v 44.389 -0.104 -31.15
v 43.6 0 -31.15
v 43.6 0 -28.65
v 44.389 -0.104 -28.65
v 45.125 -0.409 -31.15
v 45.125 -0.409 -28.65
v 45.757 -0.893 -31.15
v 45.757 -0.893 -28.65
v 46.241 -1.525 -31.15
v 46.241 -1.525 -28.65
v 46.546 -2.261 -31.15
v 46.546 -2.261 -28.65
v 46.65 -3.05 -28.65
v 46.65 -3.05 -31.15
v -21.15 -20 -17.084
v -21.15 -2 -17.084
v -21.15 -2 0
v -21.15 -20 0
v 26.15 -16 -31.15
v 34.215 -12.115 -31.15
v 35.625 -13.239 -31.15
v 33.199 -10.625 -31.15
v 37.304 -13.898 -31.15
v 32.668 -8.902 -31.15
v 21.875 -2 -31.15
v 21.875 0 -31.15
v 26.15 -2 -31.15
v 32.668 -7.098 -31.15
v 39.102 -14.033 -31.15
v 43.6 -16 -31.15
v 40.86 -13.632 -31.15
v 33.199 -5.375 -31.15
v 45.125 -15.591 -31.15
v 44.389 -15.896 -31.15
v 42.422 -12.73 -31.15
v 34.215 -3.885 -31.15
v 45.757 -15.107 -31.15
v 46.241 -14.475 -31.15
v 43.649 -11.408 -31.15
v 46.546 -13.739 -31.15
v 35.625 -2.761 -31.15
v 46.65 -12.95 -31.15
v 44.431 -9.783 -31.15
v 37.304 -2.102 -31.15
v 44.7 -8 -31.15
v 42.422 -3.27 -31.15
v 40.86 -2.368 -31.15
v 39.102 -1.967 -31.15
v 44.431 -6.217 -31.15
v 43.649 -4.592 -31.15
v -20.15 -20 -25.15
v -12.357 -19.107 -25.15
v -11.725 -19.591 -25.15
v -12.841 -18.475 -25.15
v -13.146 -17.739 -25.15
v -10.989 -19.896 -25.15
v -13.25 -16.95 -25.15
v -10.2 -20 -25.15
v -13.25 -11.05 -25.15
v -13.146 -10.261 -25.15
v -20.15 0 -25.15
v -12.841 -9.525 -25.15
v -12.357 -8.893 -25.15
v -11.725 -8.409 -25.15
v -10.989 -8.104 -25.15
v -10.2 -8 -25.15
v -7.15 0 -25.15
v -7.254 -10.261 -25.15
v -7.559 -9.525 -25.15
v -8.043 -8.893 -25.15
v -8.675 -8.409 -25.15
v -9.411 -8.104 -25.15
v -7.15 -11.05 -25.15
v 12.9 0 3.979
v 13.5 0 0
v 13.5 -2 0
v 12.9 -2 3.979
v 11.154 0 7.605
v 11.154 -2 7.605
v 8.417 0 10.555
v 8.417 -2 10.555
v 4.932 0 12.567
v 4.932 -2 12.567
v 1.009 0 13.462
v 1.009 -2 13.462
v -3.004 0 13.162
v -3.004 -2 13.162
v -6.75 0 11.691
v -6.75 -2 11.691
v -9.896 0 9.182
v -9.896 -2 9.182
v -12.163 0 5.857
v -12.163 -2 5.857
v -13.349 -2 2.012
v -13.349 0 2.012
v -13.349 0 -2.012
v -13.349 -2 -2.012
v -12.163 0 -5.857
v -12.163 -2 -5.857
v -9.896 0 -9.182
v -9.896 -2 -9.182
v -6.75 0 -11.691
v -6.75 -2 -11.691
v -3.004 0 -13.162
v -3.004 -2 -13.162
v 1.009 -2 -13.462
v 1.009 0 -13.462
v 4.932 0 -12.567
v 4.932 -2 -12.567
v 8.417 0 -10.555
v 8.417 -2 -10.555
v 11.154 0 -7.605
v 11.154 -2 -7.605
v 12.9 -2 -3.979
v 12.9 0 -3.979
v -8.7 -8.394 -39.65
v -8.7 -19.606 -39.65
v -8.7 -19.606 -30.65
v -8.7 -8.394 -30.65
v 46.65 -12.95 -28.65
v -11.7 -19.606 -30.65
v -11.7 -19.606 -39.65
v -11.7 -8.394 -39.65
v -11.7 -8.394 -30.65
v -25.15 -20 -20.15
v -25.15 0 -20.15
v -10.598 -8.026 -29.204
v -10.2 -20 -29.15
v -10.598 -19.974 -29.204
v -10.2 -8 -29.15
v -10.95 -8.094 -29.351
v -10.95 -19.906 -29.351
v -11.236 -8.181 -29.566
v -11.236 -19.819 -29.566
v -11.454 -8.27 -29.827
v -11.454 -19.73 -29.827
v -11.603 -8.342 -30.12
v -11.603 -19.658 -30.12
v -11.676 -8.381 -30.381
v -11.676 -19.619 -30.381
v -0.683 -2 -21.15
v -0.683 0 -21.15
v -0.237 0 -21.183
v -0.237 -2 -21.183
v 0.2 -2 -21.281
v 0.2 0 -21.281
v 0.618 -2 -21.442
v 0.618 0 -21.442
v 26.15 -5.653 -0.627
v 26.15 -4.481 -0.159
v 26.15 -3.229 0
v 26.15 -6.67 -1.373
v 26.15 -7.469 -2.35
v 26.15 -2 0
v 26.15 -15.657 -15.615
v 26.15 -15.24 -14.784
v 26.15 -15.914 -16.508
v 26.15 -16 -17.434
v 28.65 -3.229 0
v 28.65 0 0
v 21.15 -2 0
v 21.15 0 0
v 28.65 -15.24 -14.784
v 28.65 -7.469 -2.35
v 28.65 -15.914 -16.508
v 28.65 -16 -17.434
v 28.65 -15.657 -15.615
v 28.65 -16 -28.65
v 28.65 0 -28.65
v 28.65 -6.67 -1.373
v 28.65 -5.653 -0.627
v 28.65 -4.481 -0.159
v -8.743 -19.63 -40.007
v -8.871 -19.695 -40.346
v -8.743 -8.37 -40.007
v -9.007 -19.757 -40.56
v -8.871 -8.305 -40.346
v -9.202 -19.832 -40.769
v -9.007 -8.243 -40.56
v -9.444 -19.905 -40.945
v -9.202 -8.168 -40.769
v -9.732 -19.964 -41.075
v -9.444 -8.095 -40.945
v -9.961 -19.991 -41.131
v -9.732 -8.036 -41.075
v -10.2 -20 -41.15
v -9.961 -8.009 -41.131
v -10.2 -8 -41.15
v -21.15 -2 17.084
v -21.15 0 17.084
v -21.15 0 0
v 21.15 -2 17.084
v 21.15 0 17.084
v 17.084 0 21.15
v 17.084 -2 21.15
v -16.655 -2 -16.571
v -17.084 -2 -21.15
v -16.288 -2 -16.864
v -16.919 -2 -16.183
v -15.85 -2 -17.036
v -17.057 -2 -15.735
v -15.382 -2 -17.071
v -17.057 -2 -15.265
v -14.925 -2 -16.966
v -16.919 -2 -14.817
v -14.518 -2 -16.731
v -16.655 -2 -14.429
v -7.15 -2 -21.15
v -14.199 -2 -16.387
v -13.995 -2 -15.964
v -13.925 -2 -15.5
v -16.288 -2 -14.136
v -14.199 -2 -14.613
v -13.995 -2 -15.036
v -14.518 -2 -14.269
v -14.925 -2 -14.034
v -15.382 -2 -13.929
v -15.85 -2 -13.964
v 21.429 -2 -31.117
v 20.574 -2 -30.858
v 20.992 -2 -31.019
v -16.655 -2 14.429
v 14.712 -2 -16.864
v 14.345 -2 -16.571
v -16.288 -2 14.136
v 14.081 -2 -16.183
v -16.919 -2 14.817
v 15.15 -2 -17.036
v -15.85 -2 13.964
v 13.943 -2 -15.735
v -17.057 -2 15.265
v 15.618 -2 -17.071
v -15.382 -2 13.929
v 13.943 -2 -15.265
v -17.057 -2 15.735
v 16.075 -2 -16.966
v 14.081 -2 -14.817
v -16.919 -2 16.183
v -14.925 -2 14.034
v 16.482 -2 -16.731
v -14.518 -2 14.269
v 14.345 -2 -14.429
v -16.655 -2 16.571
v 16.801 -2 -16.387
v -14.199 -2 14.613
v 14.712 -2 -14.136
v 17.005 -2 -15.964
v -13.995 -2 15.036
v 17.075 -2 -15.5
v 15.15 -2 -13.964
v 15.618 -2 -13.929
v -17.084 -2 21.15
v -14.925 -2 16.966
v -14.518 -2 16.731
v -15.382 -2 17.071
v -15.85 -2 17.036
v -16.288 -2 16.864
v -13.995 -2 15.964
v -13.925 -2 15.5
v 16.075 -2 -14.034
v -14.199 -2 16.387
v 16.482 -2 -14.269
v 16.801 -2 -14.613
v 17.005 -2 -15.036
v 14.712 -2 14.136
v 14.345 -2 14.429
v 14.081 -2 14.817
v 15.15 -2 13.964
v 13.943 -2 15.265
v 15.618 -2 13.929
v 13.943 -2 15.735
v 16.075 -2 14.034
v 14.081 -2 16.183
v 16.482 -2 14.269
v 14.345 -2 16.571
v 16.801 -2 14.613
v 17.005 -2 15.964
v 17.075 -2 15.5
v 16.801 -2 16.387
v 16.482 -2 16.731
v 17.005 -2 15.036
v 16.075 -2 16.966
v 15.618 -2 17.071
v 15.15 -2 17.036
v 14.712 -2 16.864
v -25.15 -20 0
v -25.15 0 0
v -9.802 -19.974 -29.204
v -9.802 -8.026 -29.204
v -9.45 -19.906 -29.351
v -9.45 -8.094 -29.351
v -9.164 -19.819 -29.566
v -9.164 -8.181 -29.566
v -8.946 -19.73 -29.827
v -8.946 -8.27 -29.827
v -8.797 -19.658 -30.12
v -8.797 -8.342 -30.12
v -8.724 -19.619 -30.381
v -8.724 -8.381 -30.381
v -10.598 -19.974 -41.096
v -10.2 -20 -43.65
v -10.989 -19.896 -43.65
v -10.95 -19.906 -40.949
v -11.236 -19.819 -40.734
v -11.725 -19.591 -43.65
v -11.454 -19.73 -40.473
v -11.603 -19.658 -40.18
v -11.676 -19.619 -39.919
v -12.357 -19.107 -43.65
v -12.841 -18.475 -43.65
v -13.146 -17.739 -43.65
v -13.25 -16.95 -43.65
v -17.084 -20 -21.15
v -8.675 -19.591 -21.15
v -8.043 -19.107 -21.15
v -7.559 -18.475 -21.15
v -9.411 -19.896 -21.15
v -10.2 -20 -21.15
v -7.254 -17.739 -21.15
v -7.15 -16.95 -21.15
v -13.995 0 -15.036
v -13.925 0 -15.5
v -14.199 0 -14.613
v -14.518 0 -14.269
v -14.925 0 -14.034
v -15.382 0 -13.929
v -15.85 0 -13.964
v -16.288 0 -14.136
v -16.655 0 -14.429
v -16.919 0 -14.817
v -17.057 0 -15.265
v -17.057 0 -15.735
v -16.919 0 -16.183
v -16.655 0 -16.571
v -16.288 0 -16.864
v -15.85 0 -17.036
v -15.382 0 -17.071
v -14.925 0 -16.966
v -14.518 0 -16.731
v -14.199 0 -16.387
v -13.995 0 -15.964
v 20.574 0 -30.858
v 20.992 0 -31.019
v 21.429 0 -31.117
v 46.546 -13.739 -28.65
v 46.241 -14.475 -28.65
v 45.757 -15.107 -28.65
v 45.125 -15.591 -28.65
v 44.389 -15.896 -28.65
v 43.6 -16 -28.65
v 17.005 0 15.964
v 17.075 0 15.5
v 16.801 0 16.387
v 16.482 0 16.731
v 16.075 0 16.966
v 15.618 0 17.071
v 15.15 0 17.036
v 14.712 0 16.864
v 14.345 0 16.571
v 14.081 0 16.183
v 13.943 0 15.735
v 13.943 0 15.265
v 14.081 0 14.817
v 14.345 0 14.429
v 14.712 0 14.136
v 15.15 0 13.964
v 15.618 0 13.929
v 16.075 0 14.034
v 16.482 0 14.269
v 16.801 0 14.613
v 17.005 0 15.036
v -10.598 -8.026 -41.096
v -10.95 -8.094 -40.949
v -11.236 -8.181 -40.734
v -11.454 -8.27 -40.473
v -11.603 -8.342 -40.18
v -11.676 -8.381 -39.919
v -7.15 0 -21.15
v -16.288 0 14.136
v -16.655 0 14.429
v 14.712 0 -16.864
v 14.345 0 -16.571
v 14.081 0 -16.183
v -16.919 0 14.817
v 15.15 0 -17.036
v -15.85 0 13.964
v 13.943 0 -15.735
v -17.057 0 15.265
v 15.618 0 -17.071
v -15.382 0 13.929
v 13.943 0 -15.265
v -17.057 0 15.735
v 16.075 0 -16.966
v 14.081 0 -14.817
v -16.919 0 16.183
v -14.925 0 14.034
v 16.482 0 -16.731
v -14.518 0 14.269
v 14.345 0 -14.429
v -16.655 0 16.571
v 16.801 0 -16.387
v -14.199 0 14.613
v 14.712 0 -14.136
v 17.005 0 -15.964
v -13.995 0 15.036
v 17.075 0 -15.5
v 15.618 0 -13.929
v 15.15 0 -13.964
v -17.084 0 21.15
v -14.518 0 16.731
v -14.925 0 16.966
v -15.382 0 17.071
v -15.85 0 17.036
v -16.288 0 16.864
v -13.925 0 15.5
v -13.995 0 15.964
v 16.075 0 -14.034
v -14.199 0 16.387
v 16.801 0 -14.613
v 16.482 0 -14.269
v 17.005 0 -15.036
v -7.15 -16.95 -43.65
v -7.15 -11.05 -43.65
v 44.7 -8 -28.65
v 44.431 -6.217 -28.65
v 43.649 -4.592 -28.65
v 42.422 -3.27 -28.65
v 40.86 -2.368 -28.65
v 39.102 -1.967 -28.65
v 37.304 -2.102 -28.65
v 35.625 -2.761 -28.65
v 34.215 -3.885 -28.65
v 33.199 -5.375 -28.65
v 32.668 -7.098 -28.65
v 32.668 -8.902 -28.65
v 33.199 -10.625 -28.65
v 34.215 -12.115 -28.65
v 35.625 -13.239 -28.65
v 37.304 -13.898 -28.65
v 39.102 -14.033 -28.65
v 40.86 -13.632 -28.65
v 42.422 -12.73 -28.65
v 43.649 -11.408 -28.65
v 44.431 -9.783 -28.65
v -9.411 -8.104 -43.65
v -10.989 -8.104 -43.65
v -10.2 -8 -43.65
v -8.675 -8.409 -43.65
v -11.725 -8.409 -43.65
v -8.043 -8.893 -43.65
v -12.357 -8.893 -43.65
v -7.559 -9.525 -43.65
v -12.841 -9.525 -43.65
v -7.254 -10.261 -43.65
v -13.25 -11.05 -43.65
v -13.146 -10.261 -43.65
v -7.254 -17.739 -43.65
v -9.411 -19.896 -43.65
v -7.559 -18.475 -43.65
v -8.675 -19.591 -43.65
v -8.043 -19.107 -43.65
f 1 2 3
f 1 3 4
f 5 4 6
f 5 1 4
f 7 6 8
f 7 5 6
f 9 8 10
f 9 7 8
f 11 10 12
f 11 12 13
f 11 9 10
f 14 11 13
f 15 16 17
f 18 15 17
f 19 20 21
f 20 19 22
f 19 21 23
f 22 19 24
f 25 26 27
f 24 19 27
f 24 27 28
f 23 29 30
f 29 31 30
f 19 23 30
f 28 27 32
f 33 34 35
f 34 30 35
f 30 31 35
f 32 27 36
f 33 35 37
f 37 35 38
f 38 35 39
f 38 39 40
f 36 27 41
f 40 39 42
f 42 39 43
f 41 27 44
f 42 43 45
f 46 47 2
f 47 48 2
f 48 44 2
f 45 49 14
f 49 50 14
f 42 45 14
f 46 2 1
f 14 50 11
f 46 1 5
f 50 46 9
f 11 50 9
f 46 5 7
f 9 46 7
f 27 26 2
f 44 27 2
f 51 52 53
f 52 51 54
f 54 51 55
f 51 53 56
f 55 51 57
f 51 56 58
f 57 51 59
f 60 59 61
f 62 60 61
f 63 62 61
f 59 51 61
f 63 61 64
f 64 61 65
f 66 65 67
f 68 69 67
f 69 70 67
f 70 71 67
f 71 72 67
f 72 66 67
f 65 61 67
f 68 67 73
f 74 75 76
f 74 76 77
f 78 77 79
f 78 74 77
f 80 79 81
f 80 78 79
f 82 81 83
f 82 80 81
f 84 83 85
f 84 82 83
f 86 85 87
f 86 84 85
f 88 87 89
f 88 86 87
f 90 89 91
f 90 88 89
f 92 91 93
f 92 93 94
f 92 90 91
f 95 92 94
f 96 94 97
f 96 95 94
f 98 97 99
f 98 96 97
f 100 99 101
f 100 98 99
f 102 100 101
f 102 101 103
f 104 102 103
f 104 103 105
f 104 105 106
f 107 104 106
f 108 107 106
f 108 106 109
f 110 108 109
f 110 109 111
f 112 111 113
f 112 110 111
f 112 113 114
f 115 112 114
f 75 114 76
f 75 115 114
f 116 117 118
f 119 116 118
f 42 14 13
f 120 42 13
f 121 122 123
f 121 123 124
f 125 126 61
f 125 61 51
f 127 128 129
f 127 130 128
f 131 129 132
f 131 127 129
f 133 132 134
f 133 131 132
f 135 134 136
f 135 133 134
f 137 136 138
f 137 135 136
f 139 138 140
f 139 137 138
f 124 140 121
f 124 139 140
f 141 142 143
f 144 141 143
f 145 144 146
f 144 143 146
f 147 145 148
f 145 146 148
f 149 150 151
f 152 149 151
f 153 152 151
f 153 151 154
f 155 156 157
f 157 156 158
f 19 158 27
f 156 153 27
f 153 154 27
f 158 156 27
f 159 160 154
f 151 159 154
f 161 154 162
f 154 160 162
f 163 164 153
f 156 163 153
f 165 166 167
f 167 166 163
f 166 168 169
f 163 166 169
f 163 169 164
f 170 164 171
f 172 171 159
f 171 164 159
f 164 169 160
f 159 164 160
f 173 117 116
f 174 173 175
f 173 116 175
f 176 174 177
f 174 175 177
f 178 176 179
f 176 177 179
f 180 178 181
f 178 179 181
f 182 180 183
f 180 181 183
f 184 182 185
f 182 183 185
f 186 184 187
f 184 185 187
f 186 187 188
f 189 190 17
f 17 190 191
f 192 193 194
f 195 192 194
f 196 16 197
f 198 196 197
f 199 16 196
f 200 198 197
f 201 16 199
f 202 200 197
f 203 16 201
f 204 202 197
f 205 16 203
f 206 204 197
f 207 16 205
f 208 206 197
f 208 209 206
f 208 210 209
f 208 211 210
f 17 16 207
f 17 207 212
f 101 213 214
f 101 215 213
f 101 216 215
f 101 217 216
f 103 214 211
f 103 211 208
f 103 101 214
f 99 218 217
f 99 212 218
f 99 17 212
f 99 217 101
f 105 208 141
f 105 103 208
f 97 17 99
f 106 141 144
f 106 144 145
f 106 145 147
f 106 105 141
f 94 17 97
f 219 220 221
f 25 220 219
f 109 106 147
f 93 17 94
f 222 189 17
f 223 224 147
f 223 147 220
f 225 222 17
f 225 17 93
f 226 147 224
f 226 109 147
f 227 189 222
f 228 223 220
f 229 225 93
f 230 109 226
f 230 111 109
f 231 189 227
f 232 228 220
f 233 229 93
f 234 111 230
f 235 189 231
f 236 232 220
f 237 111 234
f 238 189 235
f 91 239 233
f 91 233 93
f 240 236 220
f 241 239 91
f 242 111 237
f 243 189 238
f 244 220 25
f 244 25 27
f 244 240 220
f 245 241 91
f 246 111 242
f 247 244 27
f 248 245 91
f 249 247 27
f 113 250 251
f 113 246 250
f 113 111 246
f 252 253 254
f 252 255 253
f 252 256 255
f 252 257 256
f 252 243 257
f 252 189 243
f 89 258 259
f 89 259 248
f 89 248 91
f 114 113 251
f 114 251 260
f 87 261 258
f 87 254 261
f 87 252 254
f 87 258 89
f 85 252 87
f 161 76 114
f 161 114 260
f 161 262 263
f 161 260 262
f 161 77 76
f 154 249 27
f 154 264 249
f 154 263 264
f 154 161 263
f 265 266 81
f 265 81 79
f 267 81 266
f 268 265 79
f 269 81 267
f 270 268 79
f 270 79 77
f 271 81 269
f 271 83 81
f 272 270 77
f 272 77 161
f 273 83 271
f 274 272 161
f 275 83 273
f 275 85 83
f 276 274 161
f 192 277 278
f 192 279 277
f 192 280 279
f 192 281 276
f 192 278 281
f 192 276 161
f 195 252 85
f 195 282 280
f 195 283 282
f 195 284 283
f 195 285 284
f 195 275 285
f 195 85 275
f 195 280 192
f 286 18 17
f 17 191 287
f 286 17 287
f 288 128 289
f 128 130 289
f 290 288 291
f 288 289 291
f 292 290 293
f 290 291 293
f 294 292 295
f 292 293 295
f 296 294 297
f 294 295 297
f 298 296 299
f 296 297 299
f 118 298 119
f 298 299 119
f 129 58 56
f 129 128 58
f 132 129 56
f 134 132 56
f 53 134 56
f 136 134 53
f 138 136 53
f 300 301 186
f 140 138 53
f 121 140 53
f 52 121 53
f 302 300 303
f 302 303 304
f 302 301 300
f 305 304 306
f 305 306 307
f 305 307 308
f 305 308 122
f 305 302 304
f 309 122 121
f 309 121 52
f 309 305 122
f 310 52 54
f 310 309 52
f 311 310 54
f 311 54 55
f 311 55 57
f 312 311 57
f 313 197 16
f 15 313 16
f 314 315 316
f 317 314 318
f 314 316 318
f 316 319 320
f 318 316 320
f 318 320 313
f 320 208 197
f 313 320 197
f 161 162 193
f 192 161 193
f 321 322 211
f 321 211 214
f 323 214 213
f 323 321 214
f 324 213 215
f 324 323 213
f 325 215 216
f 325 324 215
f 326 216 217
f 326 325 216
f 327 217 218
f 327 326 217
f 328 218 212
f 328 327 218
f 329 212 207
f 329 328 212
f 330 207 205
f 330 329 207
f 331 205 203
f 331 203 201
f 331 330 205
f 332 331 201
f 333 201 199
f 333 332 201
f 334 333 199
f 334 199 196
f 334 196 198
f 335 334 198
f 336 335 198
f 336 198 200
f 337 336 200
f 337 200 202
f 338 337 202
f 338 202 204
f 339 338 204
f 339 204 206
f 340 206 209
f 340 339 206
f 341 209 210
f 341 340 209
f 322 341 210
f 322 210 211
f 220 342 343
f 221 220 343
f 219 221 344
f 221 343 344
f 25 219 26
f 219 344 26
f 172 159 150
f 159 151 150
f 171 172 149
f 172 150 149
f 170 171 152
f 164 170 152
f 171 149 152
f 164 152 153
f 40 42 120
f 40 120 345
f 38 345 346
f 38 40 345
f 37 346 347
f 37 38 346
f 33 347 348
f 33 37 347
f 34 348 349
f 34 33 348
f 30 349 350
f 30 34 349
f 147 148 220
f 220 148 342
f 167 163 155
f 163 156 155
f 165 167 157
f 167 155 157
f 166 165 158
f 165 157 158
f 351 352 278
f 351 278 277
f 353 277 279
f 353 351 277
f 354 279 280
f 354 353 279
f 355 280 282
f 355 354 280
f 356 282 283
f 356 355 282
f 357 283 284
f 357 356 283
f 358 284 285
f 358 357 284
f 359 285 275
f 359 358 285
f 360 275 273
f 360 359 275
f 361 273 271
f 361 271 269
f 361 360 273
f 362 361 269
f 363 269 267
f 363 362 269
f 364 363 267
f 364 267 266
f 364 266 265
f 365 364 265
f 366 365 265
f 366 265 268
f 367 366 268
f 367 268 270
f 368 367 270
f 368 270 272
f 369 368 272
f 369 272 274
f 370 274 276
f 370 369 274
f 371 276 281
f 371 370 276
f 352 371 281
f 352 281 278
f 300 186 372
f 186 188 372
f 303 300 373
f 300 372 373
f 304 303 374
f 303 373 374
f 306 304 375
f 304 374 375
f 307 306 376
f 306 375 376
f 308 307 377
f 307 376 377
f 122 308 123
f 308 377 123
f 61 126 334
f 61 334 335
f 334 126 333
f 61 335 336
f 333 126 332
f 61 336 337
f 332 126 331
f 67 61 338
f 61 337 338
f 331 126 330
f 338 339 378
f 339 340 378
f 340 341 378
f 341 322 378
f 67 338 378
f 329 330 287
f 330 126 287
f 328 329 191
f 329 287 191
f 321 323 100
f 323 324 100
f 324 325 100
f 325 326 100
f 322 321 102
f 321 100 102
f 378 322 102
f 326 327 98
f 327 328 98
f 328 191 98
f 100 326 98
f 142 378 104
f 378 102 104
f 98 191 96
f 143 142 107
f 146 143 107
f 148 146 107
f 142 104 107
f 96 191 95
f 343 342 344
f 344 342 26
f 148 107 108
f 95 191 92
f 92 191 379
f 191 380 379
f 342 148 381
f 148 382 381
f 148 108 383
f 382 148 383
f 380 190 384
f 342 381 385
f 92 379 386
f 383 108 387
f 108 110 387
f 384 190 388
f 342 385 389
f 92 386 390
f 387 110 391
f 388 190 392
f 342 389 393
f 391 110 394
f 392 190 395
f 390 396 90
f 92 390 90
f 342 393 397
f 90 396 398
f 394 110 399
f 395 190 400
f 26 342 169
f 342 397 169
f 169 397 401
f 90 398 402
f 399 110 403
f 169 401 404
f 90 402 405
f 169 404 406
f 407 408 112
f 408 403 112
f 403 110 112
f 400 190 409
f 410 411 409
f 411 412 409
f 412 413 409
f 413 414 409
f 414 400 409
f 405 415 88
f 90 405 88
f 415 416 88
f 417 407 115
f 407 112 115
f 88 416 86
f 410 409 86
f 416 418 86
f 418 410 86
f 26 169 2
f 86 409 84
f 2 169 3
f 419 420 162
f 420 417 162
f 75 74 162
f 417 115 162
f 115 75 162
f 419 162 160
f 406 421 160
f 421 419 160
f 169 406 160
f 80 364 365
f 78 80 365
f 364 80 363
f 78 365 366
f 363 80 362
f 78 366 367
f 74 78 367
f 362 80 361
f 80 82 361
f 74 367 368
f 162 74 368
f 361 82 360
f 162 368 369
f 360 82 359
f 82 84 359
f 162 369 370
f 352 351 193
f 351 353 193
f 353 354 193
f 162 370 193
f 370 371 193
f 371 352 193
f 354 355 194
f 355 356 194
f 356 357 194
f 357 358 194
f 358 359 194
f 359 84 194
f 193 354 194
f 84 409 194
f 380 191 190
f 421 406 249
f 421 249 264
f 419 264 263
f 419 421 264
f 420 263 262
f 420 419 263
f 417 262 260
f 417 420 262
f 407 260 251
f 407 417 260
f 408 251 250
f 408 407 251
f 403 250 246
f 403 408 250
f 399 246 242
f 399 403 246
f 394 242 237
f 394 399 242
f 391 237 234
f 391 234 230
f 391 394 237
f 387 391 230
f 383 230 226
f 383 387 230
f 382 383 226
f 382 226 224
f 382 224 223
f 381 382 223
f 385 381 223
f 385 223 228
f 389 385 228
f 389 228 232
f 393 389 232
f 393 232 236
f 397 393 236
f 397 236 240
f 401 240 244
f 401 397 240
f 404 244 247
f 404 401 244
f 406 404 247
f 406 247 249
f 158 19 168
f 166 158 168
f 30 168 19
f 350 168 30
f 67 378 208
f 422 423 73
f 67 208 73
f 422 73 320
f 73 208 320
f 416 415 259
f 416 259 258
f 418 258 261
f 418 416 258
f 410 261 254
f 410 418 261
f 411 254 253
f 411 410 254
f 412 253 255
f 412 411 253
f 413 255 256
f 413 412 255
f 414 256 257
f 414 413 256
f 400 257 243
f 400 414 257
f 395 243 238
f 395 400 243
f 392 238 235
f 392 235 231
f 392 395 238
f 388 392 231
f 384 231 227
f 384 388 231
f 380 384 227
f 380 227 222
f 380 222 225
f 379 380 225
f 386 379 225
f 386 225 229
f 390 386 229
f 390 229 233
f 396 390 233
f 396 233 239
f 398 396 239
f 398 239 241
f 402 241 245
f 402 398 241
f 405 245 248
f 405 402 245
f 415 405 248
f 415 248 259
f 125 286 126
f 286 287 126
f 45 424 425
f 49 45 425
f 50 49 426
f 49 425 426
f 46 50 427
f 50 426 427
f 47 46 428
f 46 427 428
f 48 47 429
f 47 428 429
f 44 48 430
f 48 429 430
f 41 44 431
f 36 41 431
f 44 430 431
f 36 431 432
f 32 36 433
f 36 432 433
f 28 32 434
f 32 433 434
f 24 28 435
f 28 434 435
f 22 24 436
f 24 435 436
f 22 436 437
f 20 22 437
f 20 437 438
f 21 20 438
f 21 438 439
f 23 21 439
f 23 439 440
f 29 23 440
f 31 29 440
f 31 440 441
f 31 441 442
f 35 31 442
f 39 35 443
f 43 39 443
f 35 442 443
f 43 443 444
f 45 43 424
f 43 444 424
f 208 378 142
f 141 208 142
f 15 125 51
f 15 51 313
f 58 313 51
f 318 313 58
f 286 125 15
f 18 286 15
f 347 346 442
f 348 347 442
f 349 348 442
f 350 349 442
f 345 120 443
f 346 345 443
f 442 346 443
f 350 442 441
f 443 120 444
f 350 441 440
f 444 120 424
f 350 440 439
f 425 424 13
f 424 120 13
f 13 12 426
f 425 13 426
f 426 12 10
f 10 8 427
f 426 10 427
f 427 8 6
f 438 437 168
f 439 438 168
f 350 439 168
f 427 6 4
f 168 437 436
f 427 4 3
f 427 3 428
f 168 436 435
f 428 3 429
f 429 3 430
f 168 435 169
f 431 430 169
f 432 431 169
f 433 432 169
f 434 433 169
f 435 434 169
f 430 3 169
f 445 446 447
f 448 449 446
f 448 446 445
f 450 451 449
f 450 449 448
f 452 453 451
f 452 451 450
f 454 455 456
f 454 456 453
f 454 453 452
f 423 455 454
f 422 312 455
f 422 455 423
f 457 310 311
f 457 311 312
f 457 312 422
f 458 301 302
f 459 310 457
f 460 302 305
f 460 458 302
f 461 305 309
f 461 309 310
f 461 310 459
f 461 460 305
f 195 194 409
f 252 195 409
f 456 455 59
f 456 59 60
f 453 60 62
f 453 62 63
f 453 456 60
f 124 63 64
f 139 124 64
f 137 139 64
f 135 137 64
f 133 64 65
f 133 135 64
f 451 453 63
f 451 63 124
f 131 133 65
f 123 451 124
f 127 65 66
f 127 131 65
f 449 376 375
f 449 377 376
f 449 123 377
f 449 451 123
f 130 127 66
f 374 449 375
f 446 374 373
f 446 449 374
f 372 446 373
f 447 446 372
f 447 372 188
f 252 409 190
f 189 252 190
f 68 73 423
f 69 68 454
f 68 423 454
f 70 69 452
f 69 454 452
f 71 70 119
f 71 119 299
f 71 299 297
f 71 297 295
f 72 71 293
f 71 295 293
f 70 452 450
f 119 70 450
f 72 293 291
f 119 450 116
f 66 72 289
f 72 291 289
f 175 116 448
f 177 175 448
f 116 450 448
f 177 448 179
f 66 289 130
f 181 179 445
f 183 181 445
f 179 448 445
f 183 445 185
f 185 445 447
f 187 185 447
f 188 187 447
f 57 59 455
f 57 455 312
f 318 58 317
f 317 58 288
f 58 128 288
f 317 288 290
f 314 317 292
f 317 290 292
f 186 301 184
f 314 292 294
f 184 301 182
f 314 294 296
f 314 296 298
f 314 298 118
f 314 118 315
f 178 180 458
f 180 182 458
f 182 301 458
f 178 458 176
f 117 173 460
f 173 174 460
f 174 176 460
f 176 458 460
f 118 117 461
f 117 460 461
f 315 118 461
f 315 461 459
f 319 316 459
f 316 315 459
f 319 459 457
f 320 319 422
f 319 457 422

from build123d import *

# Parameters (mm, degrees)
F0_R         = 1.575
F0_R_2       = 13.5
F0_W         = 5
F0_H         = 21.15
F1_DEPTH     = 2
F2_DEPTH     = 20
F3_DEPTH     = 16
F4_R         = 6.05
F5_DEPTH     = 2.5
F6_W         = 6.1
F6_H         = 12
F7_DEPTH     = 18.5
F8_W         = 3
F8_H         = 12
F9_DEPTH     = 12
F10_T1_DEPTH = 2
F10_T3_DEPTH = 26.125
F10_T5_DEPTH = 37.75
F10_T7_DEPTH = 17.75
F10_T9_DEPTH = 5.4173756904
F11_R        = 1.49999
F12_SIZE     = 5
F13_SIZE2    = 16
F13_SIZE     = 10
F14_R        = 5


# Not quite as in the source:
# - a fillet or chamfer that OpenCascade refuses, or shapes differently, is made with other operations: its cross-section is extruded or revolved along the edge and cut away or added
# - a fillet or chamfer is up to 0.001 mm smaller than in the source, because OpenCascade refuses the exact size
# - a feature names something its author has since deleted; it is built from what else it names


with BuildPart() as f1:
    # F0 (on Front) → F1 (new body)
    with BuildSketch(Plane.XZ):
        Polygon((-21.15, -17.0841360082), (-21.15, 0), (-25.15, 0), (-25.15, -25.15), (-7.15, -25.15), (-7.15, -21.15), (-17.0841360082, -21.15), (-21.15, -21.15), align=None)
        Polygon((21.15, 17.0841360082), (17.0841360082, 21.15), (-17.0841360082, 21.15), (-21.15, 17.0841360082), (-21.15, 0), (-21.15, -17.0841360082), (-17.0841360082, -21.15), (-7.15, -21.15), (0, -21.15), (21.15, -21.15), (21.15, 0), align=None)
        with Locations((-15.5, -15.5)):
            Circle(F0_R, mode=Mode.SUBTRACT)
        with Locations((15.5, -15.5)):
            Circle(F0_R, mode=Mode.SUBTRACT)
        Circle(F0_R_2, mode=Mode.SUBTRACT)
        with Locations((-15.5, 15.5)):
            Circle(F0_R, mode=Mode.SUBTRACT)
        with Locations((15.5, 15.5)):
            Circle(F0_R, mode=Mode.SUBTRACT)
        Polygon((-17.0841360082, -21.15), (-21.15, -17.0841360082), (-21.15, -21.15), align=None)
        Polygon((26.15, -21.15), (21.15, -21.15), (0, -21.15), (21.1919918656, -31.15), (26.15, -31.15), align=None)
        Polygon((28.65, 0), (26.15, 0), (26.15, -21.15), (26.15, -31.15), (46.65, -31.15), (46.65, -28.65), (28.65, -28.65), align=None)
        with Locations((23.65, -10.575)):
            Rectangle(F0_W, F0_H)
    extrude(amount=F1_DEPTH)

    # F0 (on Front) → F2 (join)
    with BuildSketch(Plane.XZ):
        Polygon((-21.15, -17.0841360082), (-21.15, 0), (-25.15, 0), (-25.15, -25.15), (-7.15, -25.15), (-7.15, -21.15), (-17.0841360082, -21.15), (-21.15, -21.15), align=None)
        Polygon((-17.0841360082, -21.15), (-21.15, -17.0841360082), (-21.15, -21.15), align=None)
    extrude(amount=F2_DEPTH)

    # F0 (on Front) → F3 (join)
    with BuildSketch(Plane.XZ):
        Polygon((28.65, 0), (26.15, 0), (26.15, -21.15), (26.15, -31.15), (46.65, -31.15), (46.65, -28.65), (28.65, -28.65), align=None)
    extrude(amount=F3_DEPTH)

    # F4 (on face) → F5 (cut, through all)
    with BuildSketch(Plane.XY.offset(-28.65)):
        with Locations((38.65, -8)):
            Circle(F4_R)
    extrude(amount=-F5_DEPTH, mode=Mode.SUBTRACT)

    # F6 (on face) → F7 (join)
    with BuildSketch(Plane(origin=(0, 0, -25.15), x_dir=(1, 0, 0), z_dir=(0, 0, -1))):
        with Locations((-10.2, 14)):
            Rectangle(F6_W, F6_H)
    extrude(amount=F7_DEPTH)

    # F8 (on face) → F9 (cut, through all)
    with BuildSketch(Plane.XZ.offset(20)):
        with Locations((-10.2, -35.15)):
            Rectangle(F8_W, F8_H)
    extrude(amount=-F9_DEPTH, mode=Mode.SUBTRACT)

    # F10: fillet of radius 3.05 on 8 edges, made by hand

    # F10_s2 → F10_t1 (join)
    with BuildSketch(Plane.XZ):
        with BuildLine():
            ThreePointArc((-0.6834751381, -21.15), (-0.0165404304, -21.2238114818), (0.6181139894, -21.4416733799))
            Line((0.6181139894, -21.4416733799), (0, -21.15))
            Line((0, -21.15), (-0.6834751381, -21.15))
        make_face()
    extrude(amount=F10_T1_DEPTH)

    # F10_s4 → F10_t3 (cut)
    with BuildSketch(Plane.XY.offset(-51.275)):
        with BuildLine():
            ThreePointArc((-13.25, -11.05), (-12.3566756826, -8.8933243174), (-10.2, -8))
            Line((-10.2, -8), (-13.25, -8))
            Line((-13.25, -8), (-13.25, -11.05))
        make_face()
        with BuildLine():
            ThreePointArc((-7.15, -11.05), (-8.0433243174, -8.8933243174), (-10.2, -8))
            Line((-10.2, -8), (-7.15, -8))
            Line((-7.15, -8), (-7.15, -11.05))
        make_face()
        with BuildLine():
            ThreePointArc((-10.2, -20), (-12.3566756826, -19.1066756826), (-13.25, -16.95))
            Line((-13.25, -16.95), (-13.25, -20))
            Line((-13.25, -20), (-10.2, -20))
        make_face()
    extrude(amount=F10_T3_DEPTH, mode=Mode.SUBTRACT)

    # F10_s6 → F10_t5 (cut)
    with BuildSketch(Plane.XY.offset(-51.275)):
        with BuildLine():
            ThreePointArc((-10.2, -20), (-8.0433243174, -19.1066756826), (-7.15, -16.95))
            Line((-7.15, -16.95), (-7.15, -20))
            Line((-7.15, -20), (-10.2, -20))
        make_face()
    extrude(amount=F10_T5_DEPTH, mode=Mode.SUBTRACT)

    # F10_s8 → F10_t7 (cut)
    with BuildSketch(Plane.XY.offset(-38.775)):
        with BuildLine():
            ThreePointArc((46.65, -12.95), (45.7566756826, -15.1066756826), (43.6, -16))
            Line((43.6, -16), (46.65, -16))
            Line((46.65, -16), (46.65, -12.95))
        make_face()
        with BuildLine():
            ThreePointArc((43.6, 0), (45.7566756826, -0.8933243174), (46.65, -3.05))
            Line((46.65, -3.05), (46.65, 0))
            Line((46.65, 0), (43.6, 0))
        make_face()
    extrude(amount=F10_T7_DEPTH, mode=Mode.SUBTRACT)

    # F10_s10 → F10_t9 (cut)
    with BuildSketch(Plane.XZ.offset(-1.7086878452)):
        with BuildLine():
            ThreePointArc((20.5738778763, -30.8583266201), (21.208532296, -31.0761885182), (21.8754670037, -31.15))
            Line((21.8754670037, -31.15), (21.1919918656, -31.15))
            Line((21.1919918656, -31.15), (20.5738778763, -30.8583266201))
        make_face()
    extrude(amount=F10_T9_DEPTH, mode=Mode.SUBTRACT)

    # F11 (radius 1.5 in the source; OpenCascade refuses exactly that, so slightly less here)
    f11_edges = [f1.edges().sort_by_distance(p)[0] for p in [
        (-11.7, -14, -29.15),
        (-8.7, -14, -29.15),
        (-11.7, -14, -41.15),
        (-8.7, -14, -41.15),
    ]]
    fillet(f11_edges, radius=F11_R)

    # F12
    f12_edges = [f1.edges().sort_by_distance(p)[0] for p in [
        (-25.15, -10, -25.15),
    ]]
    chamfer(f12_edges, length=F12_SIZE)

    # F13
    f13_edges = [f1.edges().sort_by_distance(p)[0] for p in [
        (27.4, -16, 0),
    ]]
    f13_side = f1.faces().sort_by_distance((26.65, -6.6, 0))[0]
    chamfer(f13_edges, length=F13_SIZE, length2=F13_SIZE2, reference=f13_side)

    # F14
    f14_edges = [f1.edges().sort_by_distance(p)[0] for p in [
        (27.4, -16, -16),
        (27.4, -6, 0),
    ]]
    fillet(f14_edges, radius=F14_R)


solid = f1.part
